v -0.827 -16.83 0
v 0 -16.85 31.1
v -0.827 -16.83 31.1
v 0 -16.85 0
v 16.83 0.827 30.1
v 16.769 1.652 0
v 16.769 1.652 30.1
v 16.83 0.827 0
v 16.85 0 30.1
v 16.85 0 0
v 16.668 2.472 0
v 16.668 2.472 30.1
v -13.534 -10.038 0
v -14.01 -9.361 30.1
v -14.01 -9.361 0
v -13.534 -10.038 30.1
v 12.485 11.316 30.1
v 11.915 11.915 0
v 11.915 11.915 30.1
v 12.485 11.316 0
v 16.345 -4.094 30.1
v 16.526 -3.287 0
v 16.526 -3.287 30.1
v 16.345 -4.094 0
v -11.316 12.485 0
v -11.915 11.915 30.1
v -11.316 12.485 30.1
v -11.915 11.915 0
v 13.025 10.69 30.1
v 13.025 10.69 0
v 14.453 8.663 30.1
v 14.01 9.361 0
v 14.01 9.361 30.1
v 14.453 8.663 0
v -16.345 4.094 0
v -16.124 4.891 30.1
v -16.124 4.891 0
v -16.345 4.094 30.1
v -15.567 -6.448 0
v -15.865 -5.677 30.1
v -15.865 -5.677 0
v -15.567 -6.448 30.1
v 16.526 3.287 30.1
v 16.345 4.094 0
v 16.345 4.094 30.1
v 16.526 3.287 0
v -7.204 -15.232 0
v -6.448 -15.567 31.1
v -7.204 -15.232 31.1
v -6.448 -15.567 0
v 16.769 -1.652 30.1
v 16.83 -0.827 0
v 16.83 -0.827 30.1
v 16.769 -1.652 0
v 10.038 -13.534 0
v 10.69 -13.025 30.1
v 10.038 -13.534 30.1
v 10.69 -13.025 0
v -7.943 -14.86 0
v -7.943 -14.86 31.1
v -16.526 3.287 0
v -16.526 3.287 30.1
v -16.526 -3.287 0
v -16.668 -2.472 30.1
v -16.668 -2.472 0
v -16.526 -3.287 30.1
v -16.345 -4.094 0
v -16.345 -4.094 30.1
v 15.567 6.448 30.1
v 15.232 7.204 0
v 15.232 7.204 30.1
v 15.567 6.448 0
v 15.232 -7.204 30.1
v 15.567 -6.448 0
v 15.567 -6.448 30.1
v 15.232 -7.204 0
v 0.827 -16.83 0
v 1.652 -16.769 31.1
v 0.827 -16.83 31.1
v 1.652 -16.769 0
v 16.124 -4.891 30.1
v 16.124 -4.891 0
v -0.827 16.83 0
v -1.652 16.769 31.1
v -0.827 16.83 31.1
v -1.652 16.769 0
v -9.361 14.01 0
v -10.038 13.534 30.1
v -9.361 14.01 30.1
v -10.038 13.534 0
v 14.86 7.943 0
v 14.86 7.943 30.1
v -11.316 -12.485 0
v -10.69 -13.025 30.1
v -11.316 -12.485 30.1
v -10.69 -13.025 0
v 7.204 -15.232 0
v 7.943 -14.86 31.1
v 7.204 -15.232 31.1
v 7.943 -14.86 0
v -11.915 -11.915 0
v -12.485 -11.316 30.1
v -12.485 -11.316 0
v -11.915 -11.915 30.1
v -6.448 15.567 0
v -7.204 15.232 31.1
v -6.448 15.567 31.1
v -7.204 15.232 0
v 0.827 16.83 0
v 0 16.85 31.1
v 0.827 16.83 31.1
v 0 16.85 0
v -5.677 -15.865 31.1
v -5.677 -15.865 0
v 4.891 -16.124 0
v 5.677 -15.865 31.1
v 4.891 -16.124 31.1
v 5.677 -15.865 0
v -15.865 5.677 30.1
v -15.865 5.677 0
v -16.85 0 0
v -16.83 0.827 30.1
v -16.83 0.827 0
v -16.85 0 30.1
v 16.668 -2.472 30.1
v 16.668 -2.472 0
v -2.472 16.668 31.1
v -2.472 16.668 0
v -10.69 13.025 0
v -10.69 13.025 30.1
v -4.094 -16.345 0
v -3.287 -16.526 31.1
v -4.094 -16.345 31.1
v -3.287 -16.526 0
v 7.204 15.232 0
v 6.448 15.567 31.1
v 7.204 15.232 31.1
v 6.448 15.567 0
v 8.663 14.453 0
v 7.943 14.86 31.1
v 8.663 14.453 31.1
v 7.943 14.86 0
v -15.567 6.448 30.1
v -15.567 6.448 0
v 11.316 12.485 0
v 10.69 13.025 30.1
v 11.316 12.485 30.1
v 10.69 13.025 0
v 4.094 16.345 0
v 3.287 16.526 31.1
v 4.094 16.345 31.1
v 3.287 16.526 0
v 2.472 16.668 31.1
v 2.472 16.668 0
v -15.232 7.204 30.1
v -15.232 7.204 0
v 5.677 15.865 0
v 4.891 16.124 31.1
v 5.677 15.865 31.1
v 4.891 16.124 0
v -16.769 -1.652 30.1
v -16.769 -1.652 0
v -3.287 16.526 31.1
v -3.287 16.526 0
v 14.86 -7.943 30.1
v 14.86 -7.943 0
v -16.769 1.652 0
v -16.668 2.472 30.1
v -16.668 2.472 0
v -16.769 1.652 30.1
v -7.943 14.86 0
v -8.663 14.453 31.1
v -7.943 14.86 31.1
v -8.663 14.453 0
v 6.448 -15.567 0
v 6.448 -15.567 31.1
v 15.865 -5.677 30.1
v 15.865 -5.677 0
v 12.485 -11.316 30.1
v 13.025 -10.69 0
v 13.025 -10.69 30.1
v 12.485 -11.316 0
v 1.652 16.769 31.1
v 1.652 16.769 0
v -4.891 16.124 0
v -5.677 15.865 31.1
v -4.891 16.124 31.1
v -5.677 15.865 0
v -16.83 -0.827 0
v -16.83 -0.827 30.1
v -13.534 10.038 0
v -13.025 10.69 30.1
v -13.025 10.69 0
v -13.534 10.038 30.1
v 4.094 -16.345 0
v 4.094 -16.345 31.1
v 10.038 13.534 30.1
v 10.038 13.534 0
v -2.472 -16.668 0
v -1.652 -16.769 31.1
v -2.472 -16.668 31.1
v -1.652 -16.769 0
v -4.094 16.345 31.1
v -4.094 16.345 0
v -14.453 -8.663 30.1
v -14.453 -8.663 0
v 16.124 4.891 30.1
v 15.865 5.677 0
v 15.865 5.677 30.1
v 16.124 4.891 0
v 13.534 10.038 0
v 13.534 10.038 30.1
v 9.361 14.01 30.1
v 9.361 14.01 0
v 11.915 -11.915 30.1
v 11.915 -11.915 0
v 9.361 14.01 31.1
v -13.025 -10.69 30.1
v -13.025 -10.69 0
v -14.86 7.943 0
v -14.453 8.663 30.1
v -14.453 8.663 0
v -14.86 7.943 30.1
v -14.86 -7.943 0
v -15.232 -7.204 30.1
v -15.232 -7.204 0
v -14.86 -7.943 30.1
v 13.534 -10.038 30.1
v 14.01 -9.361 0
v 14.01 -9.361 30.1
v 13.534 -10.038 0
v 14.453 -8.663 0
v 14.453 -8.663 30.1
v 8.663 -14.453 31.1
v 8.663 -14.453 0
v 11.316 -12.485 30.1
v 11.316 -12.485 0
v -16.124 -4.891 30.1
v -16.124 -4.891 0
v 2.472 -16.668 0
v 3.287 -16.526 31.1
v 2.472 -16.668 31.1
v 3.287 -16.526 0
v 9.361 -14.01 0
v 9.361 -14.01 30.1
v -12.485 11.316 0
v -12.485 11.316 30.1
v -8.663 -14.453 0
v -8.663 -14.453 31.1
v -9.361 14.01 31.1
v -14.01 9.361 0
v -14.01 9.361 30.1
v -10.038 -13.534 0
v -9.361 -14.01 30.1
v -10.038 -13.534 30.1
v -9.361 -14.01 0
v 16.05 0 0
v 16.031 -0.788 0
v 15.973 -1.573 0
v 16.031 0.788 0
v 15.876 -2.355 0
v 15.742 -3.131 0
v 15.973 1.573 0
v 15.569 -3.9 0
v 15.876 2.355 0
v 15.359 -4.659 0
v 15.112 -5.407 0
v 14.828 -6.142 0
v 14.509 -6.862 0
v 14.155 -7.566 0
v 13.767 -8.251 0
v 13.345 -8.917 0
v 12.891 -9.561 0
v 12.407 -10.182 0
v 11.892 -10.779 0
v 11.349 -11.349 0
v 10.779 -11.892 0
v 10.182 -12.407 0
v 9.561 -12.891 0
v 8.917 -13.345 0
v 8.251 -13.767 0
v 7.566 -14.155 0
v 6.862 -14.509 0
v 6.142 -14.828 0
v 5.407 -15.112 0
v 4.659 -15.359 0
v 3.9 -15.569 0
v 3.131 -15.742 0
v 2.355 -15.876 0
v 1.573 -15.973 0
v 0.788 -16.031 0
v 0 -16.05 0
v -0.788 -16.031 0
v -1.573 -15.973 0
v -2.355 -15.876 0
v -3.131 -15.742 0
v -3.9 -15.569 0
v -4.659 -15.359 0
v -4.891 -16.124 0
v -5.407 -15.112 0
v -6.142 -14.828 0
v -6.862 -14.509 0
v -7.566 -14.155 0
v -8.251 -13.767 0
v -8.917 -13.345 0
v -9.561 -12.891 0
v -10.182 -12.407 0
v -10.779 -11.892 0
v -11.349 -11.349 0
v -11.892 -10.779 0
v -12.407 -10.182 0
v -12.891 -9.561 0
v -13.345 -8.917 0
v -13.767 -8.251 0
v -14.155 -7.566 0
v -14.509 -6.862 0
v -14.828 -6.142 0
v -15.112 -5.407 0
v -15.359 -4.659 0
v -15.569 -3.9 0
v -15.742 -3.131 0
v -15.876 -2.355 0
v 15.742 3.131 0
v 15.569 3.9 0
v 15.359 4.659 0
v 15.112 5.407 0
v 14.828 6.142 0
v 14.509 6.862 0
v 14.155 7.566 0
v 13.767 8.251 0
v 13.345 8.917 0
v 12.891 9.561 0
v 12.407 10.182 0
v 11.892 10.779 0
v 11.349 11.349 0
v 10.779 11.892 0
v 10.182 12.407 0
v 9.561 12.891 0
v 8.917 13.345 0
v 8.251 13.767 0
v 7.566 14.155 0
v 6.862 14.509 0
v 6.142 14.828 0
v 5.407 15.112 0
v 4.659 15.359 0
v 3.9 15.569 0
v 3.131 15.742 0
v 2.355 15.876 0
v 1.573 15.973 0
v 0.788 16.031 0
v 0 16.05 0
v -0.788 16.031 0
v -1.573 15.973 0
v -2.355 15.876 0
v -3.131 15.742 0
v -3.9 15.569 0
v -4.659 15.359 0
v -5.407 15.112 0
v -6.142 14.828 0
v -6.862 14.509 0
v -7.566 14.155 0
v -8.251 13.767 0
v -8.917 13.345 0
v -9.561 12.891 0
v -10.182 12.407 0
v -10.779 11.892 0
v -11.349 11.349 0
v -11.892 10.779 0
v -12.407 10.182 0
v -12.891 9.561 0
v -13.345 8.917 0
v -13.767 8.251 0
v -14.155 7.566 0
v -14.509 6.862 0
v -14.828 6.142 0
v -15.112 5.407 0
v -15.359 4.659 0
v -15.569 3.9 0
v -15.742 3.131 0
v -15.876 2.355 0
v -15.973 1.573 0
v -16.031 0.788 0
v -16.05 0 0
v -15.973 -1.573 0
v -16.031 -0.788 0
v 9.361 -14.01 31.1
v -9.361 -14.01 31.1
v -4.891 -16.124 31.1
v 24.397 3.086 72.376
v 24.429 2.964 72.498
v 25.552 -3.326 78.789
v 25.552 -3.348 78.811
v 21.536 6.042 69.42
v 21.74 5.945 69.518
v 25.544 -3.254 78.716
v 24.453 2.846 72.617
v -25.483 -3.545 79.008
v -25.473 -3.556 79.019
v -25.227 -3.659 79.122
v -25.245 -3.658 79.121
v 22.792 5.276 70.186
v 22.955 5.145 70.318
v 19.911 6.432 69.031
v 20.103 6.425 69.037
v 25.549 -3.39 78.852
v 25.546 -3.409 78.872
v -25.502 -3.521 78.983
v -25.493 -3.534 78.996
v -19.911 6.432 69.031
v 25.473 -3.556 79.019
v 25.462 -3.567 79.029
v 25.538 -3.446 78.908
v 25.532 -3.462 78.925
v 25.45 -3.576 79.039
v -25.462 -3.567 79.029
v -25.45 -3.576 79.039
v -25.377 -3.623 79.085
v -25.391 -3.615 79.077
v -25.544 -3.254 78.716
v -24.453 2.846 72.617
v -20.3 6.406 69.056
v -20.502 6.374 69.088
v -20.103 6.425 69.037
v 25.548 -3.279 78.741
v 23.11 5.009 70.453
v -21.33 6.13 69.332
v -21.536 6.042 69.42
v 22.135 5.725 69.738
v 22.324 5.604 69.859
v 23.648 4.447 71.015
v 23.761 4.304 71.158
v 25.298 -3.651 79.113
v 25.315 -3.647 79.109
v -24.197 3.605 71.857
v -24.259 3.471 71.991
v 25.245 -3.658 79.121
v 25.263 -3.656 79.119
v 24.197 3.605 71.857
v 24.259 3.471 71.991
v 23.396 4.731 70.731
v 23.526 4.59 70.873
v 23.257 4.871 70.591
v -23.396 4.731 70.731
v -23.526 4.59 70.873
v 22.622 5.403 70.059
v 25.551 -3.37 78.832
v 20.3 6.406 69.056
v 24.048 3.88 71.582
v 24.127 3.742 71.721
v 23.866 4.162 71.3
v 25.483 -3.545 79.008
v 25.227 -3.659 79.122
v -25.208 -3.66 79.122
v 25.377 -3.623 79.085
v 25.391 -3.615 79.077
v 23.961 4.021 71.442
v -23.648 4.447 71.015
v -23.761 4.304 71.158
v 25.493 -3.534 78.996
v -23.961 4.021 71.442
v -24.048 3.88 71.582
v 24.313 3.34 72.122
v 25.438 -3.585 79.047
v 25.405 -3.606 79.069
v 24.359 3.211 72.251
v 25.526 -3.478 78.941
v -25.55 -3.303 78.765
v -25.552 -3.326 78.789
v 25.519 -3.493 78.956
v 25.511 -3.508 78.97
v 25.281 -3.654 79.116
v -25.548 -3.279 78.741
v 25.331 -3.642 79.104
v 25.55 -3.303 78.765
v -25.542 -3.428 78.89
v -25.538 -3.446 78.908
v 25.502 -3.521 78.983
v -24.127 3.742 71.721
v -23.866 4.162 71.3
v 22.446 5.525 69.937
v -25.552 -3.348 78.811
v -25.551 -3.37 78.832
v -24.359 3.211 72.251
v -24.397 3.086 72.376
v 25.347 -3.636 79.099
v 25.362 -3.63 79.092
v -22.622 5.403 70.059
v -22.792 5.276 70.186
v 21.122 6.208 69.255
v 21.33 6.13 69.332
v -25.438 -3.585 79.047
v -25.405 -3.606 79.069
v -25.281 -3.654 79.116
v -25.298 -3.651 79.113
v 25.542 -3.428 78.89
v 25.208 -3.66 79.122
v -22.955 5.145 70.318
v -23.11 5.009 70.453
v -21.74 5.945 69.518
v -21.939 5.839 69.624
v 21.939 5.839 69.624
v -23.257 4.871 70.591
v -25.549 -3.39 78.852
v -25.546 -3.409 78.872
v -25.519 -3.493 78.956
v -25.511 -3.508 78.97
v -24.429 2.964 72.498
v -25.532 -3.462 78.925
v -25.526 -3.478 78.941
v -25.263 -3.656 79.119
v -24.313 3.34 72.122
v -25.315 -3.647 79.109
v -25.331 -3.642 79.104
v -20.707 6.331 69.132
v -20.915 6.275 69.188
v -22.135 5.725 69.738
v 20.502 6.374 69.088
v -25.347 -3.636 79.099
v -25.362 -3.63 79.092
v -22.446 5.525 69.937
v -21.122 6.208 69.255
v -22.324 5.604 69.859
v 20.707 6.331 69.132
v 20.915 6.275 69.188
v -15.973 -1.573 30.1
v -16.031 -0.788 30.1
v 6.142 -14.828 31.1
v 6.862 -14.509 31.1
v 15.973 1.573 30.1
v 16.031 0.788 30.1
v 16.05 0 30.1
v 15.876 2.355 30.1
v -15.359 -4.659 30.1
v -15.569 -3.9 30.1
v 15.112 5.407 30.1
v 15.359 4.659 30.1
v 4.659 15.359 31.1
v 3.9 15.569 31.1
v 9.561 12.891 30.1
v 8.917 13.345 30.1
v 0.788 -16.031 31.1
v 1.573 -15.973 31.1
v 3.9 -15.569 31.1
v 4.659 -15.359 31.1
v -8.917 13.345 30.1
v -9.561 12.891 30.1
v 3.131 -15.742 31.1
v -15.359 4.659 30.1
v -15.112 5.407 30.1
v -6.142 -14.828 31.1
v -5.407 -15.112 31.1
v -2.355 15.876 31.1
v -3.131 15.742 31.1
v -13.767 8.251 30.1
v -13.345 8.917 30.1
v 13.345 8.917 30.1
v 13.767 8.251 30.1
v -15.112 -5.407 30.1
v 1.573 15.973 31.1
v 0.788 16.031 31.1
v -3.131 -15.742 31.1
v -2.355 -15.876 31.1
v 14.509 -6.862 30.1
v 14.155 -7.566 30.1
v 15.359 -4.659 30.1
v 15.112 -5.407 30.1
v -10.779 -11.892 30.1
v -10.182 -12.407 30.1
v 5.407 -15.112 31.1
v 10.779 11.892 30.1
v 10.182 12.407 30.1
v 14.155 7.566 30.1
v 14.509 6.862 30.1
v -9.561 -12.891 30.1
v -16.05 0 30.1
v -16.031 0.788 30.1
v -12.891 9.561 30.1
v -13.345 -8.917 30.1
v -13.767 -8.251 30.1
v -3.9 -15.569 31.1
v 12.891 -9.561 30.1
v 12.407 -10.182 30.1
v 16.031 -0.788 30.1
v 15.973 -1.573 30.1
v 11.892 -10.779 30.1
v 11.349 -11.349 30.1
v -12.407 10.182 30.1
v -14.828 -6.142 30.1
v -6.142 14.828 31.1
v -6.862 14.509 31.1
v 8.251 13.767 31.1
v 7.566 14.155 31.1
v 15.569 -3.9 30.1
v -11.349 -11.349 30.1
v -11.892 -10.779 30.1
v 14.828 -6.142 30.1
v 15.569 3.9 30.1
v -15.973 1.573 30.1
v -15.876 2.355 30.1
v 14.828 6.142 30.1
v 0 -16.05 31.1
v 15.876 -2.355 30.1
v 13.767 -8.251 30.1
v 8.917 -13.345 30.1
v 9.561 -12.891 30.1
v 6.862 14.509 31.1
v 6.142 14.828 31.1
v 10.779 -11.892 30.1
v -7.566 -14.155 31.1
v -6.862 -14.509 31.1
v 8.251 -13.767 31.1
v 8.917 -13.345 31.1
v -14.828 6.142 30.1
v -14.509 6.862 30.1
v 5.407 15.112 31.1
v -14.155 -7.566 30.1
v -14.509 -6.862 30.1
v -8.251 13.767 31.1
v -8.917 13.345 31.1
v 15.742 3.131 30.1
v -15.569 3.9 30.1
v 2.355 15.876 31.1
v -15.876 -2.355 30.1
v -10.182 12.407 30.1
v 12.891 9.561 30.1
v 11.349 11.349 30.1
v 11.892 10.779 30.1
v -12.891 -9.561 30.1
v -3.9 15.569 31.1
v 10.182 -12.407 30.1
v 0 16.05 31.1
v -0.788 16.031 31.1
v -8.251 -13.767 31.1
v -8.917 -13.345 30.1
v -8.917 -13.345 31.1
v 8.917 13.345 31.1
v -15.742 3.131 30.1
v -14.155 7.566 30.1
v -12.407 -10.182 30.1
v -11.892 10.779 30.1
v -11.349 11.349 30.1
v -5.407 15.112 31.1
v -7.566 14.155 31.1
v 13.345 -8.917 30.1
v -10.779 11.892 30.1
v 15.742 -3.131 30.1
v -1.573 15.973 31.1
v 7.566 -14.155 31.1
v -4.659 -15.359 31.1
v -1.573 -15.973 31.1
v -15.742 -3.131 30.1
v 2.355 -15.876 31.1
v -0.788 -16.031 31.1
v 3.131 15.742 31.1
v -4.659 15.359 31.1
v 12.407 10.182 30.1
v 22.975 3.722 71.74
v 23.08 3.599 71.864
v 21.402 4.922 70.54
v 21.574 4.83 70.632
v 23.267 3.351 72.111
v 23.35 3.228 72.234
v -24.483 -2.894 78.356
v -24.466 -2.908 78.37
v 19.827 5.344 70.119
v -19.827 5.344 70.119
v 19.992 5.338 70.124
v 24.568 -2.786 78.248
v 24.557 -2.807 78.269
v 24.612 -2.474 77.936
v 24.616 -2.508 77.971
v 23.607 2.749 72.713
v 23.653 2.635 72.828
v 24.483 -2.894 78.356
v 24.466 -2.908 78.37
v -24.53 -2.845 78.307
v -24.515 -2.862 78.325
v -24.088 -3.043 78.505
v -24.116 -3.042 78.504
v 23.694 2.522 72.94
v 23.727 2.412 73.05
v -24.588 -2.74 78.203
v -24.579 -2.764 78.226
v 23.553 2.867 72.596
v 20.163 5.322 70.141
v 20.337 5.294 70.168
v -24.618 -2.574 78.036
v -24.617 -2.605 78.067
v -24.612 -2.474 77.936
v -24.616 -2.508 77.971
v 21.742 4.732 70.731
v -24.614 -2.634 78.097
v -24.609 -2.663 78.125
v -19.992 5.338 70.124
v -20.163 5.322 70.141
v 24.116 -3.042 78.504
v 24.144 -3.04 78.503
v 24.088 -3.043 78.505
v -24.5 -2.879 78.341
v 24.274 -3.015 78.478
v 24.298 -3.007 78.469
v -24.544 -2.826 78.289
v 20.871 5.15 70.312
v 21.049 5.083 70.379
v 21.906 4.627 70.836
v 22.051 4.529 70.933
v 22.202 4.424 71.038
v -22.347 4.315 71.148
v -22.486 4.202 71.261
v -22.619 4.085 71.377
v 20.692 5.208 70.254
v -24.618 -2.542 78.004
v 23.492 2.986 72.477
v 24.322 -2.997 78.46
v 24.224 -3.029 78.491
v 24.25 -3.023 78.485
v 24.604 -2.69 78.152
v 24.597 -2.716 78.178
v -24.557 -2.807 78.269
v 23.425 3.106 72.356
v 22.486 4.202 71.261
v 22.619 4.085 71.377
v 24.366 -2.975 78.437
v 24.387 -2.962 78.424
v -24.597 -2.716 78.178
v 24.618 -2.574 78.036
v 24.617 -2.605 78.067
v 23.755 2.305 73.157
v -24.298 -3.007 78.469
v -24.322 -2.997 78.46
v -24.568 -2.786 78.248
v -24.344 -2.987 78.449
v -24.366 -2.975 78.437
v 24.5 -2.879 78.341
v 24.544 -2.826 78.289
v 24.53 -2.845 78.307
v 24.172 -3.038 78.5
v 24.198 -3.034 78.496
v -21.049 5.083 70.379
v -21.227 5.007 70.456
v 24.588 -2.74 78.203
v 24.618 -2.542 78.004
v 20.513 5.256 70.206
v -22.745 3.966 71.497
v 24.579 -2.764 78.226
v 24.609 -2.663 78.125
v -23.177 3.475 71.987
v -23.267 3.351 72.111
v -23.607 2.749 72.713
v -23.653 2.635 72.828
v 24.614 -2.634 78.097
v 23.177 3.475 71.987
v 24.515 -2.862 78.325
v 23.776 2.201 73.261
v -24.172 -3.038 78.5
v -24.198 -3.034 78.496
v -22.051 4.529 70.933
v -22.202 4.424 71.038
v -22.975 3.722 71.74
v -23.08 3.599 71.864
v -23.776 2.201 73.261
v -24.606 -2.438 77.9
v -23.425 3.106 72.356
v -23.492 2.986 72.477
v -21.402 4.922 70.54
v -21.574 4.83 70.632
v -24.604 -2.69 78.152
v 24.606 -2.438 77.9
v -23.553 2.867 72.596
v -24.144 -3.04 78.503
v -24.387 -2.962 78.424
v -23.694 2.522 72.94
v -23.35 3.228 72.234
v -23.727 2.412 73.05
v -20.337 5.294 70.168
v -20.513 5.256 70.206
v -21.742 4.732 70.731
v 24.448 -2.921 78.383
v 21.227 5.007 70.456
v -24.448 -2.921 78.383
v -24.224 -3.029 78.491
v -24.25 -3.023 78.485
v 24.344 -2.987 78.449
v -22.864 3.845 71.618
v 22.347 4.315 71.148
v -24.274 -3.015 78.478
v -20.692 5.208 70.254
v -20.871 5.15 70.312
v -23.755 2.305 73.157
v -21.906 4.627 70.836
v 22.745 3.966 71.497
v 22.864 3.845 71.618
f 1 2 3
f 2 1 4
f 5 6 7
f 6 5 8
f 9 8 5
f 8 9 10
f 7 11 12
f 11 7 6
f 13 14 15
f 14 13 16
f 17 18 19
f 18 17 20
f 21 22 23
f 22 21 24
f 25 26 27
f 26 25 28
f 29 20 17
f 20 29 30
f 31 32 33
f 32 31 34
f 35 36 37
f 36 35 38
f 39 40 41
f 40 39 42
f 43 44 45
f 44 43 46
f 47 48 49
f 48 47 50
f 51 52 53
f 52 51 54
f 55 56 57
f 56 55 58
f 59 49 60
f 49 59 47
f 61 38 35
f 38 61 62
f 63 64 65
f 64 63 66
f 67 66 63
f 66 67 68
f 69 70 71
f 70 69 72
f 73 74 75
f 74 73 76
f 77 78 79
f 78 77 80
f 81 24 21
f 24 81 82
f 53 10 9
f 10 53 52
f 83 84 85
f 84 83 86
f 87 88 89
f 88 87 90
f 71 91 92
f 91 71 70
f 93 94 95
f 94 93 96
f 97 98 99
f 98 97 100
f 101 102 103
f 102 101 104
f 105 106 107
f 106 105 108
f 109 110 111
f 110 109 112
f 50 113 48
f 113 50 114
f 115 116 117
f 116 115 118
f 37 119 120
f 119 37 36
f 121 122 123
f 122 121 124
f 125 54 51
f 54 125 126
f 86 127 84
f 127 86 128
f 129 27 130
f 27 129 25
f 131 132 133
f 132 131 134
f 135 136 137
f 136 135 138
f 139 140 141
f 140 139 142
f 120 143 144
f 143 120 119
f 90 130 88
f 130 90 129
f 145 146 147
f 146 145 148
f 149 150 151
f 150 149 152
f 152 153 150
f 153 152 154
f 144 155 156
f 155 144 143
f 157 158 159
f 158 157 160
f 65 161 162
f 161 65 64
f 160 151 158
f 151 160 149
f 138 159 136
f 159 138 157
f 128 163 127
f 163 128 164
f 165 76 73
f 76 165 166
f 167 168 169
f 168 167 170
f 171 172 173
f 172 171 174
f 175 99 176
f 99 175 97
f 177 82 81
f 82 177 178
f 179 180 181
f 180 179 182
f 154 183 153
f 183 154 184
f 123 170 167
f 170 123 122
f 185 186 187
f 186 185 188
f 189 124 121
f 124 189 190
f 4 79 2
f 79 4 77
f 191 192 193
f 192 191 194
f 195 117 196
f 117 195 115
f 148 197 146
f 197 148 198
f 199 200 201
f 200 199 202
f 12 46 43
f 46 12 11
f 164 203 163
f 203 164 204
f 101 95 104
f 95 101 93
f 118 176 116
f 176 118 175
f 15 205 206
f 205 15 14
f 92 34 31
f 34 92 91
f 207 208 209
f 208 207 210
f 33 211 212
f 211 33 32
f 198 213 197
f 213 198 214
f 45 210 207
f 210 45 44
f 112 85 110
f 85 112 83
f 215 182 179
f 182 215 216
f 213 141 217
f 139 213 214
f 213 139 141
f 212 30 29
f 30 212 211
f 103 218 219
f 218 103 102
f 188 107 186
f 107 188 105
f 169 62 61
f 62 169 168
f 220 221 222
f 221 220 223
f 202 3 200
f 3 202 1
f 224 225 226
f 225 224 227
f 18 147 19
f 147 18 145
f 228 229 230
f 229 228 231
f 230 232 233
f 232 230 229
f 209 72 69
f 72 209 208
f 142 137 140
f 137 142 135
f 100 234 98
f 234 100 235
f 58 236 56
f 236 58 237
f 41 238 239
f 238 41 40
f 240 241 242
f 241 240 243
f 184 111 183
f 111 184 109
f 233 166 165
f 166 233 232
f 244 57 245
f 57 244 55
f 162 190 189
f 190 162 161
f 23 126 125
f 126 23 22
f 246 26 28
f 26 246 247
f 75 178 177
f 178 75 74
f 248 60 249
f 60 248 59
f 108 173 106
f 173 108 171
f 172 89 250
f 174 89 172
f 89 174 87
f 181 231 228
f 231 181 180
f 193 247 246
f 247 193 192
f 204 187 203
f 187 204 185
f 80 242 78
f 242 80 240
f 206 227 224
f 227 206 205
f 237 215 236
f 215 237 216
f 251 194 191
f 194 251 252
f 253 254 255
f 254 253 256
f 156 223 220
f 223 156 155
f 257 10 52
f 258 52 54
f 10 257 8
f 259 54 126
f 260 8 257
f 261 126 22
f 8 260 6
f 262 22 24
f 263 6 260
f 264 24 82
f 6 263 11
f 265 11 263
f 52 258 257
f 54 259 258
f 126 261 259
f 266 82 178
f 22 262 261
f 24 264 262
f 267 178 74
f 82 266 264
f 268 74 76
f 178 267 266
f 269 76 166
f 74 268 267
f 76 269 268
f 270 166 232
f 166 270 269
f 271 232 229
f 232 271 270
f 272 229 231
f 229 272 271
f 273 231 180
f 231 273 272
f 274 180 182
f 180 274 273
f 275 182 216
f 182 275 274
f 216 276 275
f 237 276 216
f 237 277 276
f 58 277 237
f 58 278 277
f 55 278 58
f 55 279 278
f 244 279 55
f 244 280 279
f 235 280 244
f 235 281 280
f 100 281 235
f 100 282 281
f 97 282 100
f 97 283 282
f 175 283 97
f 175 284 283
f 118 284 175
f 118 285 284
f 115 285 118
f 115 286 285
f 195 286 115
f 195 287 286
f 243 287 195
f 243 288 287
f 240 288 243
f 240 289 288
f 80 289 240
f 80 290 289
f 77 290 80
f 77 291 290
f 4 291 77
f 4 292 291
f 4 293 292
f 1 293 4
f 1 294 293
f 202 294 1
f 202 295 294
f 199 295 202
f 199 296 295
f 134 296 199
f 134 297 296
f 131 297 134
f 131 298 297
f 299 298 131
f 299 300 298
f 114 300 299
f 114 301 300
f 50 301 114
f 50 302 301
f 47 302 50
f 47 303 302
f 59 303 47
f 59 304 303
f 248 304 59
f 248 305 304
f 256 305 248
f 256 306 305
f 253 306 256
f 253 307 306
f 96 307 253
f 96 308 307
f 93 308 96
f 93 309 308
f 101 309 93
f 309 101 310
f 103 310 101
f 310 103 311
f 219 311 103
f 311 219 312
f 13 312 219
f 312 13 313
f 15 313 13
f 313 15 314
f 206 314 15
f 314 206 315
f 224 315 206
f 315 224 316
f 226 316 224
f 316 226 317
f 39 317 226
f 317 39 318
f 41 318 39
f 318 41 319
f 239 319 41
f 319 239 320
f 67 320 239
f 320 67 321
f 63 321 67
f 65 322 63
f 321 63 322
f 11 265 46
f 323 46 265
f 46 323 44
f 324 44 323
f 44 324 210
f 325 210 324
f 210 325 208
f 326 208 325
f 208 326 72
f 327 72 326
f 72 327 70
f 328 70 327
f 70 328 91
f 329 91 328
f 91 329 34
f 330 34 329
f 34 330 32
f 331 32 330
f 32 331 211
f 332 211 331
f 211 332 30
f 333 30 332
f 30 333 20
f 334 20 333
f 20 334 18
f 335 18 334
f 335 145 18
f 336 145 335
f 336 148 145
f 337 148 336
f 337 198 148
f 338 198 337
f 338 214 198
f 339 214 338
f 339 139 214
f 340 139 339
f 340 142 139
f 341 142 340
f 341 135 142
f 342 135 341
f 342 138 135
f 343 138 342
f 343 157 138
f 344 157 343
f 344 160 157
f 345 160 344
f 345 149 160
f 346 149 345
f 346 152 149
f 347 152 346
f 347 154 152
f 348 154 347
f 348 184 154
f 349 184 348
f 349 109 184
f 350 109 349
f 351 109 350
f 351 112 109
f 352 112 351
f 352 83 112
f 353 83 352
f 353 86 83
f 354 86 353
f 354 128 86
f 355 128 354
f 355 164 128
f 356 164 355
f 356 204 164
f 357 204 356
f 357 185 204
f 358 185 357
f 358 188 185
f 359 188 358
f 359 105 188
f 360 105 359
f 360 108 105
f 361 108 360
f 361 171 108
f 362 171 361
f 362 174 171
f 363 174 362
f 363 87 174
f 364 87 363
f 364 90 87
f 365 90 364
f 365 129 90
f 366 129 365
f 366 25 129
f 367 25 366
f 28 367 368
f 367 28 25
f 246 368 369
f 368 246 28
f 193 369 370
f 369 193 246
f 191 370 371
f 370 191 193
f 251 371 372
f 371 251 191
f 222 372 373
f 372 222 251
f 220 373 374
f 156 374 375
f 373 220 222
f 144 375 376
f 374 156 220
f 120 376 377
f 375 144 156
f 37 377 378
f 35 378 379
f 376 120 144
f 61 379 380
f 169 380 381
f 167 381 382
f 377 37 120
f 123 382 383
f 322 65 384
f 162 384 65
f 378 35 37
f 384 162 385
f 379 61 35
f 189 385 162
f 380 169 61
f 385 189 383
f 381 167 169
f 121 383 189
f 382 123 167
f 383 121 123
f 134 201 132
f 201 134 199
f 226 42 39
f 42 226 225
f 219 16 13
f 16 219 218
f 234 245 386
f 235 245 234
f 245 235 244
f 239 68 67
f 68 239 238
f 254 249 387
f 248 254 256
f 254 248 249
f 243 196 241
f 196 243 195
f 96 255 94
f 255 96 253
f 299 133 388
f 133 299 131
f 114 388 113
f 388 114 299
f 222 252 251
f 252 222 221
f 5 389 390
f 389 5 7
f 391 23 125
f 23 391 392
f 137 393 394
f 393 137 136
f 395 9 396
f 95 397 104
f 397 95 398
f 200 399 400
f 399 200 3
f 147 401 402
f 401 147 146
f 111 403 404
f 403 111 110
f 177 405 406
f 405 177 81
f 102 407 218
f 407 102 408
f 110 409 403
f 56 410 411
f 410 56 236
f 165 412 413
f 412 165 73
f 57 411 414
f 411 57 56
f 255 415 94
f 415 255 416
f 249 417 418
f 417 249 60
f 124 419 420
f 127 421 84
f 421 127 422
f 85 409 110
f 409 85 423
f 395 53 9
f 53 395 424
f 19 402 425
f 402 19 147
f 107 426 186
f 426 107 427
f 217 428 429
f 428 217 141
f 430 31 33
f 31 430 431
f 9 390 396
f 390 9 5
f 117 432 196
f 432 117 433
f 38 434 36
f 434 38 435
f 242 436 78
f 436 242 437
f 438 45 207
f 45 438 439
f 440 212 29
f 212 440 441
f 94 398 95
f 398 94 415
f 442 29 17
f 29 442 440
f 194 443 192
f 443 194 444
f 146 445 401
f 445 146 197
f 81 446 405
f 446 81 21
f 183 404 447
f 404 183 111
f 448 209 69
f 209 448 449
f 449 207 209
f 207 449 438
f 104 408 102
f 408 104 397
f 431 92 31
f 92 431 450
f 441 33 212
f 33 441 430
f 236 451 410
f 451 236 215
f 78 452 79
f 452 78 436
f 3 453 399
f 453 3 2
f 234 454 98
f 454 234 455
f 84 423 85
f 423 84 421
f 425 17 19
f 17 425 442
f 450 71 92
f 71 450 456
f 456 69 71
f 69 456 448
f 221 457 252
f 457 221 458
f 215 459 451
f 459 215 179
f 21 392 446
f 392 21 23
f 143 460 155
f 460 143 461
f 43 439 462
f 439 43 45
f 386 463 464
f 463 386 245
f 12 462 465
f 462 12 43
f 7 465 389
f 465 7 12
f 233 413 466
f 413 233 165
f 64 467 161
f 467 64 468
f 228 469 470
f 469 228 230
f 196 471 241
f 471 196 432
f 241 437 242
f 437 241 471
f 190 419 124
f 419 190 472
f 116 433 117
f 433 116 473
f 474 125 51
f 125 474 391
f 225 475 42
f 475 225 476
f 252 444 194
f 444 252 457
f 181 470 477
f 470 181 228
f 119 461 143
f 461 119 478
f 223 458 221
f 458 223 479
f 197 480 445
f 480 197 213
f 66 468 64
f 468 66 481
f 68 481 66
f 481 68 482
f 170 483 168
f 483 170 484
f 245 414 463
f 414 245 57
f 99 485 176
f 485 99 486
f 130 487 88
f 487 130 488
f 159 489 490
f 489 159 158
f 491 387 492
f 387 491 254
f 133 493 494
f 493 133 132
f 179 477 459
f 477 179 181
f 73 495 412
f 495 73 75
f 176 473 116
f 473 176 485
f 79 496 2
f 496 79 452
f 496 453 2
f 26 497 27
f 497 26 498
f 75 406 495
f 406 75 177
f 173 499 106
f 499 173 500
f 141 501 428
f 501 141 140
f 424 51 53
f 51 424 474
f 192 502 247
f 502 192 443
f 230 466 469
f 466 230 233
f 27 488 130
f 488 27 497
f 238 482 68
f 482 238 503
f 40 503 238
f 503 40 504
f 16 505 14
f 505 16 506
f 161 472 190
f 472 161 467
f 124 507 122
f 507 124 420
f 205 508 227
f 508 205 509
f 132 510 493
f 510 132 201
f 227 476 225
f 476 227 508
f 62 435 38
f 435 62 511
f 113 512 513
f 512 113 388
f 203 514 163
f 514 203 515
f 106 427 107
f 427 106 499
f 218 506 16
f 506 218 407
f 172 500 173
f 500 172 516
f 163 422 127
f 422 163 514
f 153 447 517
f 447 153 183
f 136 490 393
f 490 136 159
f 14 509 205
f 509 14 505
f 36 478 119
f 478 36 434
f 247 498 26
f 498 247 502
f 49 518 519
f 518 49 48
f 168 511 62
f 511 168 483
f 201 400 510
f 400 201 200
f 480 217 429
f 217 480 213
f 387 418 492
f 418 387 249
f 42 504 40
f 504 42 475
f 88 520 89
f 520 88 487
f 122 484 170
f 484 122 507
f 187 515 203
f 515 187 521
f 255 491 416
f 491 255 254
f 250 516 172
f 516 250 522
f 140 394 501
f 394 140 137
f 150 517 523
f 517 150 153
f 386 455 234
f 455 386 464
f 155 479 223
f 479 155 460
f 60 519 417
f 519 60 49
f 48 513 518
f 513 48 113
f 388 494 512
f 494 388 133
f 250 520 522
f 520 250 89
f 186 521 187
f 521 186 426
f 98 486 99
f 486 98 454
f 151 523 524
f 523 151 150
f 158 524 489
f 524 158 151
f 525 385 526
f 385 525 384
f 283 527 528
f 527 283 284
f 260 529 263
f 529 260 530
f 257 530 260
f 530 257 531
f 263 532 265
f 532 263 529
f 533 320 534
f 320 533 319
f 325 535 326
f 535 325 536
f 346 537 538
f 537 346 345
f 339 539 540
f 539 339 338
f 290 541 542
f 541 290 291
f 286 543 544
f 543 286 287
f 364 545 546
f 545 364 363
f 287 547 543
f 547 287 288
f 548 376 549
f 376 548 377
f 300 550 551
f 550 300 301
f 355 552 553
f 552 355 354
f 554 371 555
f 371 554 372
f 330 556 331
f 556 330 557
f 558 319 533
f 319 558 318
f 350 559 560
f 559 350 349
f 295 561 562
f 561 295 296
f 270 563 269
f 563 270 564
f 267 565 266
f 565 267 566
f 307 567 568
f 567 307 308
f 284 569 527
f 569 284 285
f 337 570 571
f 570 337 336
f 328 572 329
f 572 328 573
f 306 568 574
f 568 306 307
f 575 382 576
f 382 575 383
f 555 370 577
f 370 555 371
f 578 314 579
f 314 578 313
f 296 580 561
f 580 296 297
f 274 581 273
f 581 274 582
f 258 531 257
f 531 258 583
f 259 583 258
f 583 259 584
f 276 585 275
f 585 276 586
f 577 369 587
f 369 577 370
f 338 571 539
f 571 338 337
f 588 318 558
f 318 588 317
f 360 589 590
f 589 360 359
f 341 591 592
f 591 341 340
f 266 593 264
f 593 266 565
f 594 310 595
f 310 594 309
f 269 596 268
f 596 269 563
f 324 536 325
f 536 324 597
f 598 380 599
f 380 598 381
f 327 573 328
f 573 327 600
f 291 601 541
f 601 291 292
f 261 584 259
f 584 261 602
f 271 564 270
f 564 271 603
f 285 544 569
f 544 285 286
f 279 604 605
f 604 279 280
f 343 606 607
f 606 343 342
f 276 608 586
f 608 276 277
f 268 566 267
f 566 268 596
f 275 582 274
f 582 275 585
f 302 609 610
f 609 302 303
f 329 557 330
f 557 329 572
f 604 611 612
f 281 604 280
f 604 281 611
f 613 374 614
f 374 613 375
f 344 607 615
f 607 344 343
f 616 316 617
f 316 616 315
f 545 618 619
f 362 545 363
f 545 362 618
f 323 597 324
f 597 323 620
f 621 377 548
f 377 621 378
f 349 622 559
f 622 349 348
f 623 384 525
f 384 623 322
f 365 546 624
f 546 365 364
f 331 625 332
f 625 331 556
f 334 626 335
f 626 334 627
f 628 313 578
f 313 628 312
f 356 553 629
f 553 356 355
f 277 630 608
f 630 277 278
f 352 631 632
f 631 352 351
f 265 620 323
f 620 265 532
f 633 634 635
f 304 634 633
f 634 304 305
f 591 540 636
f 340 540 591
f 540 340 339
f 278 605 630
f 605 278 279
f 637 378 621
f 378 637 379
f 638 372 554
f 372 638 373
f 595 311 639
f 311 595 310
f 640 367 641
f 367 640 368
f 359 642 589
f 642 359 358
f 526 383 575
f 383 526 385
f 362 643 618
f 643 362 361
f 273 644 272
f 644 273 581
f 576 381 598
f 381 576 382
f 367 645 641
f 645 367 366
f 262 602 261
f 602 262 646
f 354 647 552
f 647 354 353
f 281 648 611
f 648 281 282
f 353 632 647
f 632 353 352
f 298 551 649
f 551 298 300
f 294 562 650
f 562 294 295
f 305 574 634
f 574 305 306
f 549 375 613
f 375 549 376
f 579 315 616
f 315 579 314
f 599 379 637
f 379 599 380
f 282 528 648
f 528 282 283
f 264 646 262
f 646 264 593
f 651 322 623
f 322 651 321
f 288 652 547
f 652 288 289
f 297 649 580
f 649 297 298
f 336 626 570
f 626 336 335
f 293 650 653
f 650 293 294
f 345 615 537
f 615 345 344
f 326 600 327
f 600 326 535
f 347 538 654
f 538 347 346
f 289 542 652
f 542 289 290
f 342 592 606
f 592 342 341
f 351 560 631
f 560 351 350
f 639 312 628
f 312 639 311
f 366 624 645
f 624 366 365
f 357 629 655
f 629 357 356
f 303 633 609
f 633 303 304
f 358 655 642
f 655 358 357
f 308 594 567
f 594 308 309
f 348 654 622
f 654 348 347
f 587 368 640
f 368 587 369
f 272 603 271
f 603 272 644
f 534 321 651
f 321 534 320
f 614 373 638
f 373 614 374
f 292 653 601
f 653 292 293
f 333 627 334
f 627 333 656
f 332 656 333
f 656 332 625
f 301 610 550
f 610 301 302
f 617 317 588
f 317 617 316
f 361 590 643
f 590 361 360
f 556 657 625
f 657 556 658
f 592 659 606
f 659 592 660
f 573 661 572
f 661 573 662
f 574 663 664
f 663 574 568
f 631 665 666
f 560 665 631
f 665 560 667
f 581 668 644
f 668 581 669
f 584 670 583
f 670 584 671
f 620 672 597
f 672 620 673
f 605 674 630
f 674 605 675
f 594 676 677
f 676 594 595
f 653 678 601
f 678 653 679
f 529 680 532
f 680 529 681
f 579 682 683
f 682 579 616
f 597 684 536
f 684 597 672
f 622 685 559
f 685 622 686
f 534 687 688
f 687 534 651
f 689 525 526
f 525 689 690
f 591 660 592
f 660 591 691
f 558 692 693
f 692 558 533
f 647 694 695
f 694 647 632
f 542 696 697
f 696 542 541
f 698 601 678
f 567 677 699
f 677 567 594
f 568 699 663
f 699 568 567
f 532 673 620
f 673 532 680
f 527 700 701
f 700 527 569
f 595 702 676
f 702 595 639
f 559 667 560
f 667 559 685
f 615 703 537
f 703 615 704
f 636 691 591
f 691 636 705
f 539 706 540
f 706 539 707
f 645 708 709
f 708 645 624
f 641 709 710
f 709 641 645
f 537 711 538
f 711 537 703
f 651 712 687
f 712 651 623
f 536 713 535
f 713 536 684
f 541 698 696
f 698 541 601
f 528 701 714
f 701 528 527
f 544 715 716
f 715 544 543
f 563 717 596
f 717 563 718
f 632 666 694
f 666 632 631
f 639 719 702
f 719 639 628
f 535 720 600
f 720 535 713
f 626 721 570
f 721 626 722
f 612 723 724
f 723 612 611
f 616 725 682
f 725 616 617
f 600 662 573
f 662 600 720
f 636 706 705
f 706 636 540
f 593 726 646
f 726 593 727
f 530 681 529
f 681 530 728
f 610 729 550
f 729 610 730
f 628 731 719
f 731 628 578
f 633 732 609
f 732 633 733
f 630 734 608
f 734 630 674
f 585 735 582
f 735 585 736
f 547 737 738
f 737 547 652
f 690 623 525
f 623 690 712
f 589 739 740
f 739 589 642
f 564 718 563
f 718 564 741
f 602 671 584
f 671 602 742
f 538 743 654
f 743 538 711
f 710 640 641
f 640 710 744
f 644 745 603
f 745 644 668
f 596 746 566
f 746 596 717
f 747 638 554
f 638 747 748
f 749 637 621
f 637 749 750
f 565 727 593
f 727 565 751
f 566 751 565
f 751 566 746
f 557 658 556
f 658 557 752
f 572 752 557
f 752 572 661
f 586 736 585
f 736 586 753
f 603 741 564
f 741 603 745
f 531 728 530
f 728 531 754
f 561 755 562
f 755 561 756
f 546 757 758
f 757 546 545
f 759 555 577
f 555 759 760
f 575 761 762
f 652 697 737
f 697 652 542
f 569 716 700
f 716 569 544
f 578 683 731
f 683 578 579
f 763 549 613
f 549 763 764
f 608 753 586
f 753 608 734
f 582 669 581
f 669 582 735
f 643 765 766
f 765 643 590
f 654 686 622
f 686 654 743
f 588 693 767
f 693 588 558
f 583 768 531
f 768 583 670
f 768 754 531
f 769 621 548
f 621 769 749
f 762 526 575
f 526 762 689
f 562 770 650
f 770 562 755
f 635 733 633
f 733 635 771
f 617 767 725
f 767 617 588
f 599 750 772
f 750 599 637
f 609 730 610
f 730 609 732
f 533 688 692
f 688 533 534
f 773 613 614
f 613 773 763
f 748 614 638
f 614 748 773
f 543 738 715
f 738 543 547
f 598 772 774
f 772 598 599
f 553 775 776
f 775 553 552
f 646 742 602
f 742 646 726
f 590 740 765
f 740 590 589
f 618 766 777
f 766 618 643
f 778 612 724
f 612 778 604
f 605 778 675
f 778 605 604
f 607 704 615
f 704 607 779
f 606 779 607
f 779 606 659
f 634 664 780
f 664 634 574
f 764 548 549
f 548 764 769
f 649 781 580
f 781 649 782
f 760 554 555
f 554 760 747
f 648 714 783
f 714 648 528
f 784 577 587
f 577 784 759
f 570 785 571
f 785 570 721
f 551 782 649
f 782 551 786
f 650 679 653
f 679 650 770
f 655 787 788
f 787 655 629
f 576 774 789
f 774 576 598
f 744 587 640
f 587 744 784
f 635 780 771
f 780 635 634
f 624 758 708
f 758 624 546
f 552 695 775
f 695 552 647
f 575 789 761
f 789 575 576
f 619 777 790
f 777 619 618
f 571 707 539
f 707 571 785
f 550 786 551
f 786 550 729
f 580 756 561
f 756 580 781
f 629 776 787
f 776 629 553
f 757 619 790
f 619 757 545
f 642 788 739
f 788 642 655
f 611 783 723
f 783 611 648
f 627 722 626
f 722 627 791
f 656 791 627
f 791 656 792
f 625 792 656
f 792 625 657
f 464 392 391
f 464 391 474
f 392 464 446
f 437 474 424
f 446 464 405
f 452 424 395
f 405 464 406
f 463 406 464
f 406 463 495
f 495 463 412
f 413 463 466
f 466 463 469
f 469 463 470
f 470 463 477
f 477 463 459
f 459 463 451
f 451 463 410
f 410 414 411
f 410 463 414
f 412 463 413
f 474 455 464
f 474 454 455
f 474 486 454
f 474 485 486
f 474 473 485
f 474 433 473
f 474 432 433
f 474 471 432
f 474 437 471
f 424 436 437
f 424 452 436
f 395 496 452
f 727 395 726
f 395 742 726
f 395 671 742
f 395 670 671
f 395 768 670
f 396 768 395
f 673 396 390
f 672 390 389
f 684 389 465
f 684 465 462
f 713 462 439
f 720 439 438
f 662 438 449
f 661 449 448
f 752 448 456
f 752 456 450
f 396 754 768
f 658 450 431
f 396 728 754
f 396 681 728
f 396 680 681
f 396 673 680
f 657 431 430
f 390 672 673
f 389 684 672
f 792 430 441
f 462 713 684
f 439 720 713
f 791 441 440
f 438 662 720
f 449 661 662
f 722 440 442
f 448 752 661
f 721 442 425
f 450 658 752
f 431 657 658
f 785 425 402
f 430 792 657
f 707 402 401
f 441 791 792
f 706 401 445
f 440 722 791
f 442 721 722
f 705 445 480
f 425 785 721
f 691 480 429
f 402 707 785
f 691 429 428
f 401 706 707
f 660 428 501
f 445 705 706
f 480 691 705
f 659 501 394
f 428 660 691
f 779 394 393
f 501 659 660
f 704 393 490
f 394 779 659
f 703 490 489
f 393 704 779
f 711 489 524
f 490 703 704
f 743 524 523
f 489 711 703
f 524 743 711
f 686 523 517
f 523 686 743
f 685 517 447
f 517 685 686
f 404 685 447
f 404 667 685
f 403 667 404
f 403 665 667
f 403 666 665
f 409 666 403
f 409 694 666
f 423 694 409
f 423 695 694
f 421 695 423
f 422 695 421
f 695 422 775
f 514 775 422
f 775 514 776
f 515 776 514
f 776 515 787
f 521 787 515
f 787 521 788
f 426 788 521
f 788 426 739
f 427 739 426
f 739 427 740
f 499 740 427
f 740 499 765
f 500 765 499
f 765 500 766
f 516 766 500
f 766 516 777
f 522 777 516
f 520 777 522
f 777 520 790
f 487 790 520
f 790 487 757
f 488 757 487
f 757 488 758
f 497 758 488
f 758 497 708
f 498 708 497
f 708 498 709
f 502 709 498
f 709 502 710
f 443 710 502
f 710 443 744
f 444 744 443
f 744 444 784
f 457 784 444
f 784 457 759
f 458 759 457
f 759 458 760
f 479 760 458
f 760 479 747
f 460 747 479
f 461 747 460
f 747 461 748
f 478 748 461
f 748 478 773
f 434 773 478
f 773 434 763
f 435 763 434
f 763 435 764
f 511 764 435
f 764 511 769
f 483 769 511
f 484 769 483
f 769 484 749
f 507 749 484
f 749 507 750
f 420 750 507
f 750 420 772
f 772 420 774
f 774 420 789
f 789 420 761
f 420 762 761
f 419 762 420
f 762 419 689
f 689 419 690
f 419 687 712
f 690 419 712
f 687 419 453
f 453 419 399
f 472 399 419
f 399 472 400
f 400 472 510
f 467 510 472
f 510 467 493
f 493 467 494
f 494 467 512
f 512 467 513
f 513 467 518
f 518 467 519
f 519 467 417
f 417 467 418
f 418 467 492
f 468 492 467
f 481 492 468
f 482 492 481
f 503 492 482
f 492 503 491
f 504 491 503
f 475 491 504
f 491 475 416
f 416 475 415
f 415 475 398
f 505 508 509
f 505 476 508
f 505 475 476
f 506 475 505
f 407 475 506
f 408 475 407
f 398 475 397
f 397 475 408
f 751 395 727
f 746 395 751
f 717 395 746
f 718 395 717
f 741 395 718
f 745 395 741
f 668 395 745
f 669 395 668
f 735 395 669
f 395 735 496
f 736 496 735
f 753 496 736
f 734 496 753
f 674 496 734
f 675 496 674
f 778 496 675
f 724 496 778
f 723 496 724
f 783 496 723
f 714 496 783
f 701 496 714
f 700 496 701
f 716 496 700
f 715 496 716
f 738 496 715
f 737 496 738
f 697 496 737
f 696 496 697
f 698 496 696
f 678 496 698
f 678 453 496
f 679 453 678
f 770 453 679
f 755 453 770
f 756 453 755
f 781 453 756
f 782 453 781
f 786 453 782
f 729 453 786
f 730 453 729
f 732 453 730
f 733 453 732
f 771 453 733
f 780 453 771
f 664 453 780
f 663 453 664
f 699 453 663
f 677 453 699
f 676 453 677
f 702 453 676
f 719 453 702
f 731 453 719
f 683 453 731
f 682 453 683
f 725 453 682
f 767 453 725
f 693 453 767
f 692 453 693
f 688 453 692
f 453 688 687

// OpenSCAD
// Parametrische Staubsauger-Aufsätze (OpenSCAD)
// Autor: Atrox3D
// Version: 1.0
// Lizenz: MIT
// Datum: 03.09.2025
// Beschreibung: Generator für Adapter, Fugendüsen, Flachdüsen und Bürstenaufsätze.
// Alle Maße sind parametrisierbar.

//Scaling
$fn = $preview ? 64 : 128;

/* [Düsentyp] */
//Was soll erzeugt werden? Moegliche Werte: "adapter", "fugen_duese", "flach_duese", "buerste"
aufsatz_typ = "flach_duese";

//Global Params

/* [adapter] */
adapter_inlet_start_diameter = 32.1;
adapter_outlet_end_diameter = 25.1;
adapter_start_length = 30.1;
adapter_end_length = 30.1;
adapter_wall_thickness = 1.6;

/* [fugen_duese] */
fugenD_inlet_start_diameter = 32.1;
fugenD_outlet_end_diameter = 15.1;
fugenD_start_length = 30.1;
fugenD_end_length = 30.1;
fugenD_wall_thickness = 1.6;
fugenD_end_angle = 0.0;

/* [flach_duese] */
flachD_inlet_start_diameter = 32.1;
flachD_outlet_end_diameter = 5.1;
flachD_start_length = 30.1;
flachD_end_length = 50.1;
flachD_wall_thickness = 1.6;
flachD_end_angle = 45;
flachD_breite = 50;

/* [Hidden] */
tiny_epsilon = 0.01;
cut_margin   = 0.1;

if (aufsatz_typ == "adapter")
    adapter(adapter_inlet_start_diameter, adapter_outlet_end_diameter, adapter_start_length,adapter_end_length, adapter_wall_thickness);


else if (aufsatz_typ == "fugen_duese")
    fugen_duese(fugenD_inlet_start_diameter, fugenD_start_length, fugenD_outlet_end_diameter, fugenD_end_length, fugenD_wall_thickness, fugenD_end_angle);


else if (aufsatz_typ == "flach_duese")
    flach_duese(flachD_inlet_start_diameter, flachD_start_length, flachD_end_length, flachD_wall_thickness, flachD_outlet_end_diameter, flachD_breite, flachD_end_angle);


//Vormodule
module adapter_base(d_in_s, d_out_e, l_s,l_e, w){
    union(){
        cylinder(h=l_s, d=d_in_s);
        translate([0,0,l_s-tiny_epsilon]) cylinder(h=d_in_s-d_out_e,d1=d_in_s,d2=d_out_e);
        translate([0,0,l_s-cut_margin]) cylinder(h=l_e+cut_margin, d=d_out_e);
        }
}

module fugen_duese_base(d_in_s, l_s, d_out_e, l_e, w, e_a){
    difference(){
        union(){
            cylinder(h=l_s, d=d_in_s);
            translate([0,0,l_s-tiny_epsilon]) cylinder(d1=d_in_s,d2=d_out_e,h=l_e);
            }
        }
}

//Endmodule
module adapter(d_in_s, d_out_e, l_s,l_e, w){
    difference(){
        adapter_base(d_in_s+2*w, d_out_e, l_s,l_e, w);
        translate([0,0,-cut_margin-w]) adapter_base(d_in_s, d_out_e-2*w, l_s,l_e+20);
        //cube([50,50,50]); //Innenansicht
    }
}

module fugen_duese(d_in_s, l_s, d_out_e, l_e, w, e_a){
    difference(){
        fugen_duese_base(d_in_s+w*2, l_s, d_out_e+w*2, l_e, w, e_a);
        translate([0,0,-cut_margin])fugen_duese_base(d_in_s, l_s, d_out_e, l_e+0.2, w, e_a);
        translate([0,0,l_s+l_e+10-e_a/10]) rotate([0,e_a,0]) cube([100,50,20],center =true);
        }
}

module flach_duese(d_in_s, l_s, l_e, w, b, l3, a){
        difference(){            
        union(){
            cylinder(h=l_s,d=d_in_s+w);
            hull(){
                translate([0,0,l_s])cylinder(h=1,d=d_in_s+w);
                translate([0,0,l_s+l_e]) cube([l3+w,b+w,cut_margin ],center=true);
            }
        }
        union(){
            translate([0,0,-cut_margin ]) cylinder(h=l_s+0.2,d=d_in_s);
            hull(){
                translate([0,0,l_s])cylinder(h=1,d=d_in_s);
                translate([0,0,l_s+l_e]) cube([l3,b,0.2],center=true);
                }
            }
            translate([0,0,l_s+l_e]) rotate([a,0,0]) cube([l3+w+1,b+w,200],center=true);
        }
}
